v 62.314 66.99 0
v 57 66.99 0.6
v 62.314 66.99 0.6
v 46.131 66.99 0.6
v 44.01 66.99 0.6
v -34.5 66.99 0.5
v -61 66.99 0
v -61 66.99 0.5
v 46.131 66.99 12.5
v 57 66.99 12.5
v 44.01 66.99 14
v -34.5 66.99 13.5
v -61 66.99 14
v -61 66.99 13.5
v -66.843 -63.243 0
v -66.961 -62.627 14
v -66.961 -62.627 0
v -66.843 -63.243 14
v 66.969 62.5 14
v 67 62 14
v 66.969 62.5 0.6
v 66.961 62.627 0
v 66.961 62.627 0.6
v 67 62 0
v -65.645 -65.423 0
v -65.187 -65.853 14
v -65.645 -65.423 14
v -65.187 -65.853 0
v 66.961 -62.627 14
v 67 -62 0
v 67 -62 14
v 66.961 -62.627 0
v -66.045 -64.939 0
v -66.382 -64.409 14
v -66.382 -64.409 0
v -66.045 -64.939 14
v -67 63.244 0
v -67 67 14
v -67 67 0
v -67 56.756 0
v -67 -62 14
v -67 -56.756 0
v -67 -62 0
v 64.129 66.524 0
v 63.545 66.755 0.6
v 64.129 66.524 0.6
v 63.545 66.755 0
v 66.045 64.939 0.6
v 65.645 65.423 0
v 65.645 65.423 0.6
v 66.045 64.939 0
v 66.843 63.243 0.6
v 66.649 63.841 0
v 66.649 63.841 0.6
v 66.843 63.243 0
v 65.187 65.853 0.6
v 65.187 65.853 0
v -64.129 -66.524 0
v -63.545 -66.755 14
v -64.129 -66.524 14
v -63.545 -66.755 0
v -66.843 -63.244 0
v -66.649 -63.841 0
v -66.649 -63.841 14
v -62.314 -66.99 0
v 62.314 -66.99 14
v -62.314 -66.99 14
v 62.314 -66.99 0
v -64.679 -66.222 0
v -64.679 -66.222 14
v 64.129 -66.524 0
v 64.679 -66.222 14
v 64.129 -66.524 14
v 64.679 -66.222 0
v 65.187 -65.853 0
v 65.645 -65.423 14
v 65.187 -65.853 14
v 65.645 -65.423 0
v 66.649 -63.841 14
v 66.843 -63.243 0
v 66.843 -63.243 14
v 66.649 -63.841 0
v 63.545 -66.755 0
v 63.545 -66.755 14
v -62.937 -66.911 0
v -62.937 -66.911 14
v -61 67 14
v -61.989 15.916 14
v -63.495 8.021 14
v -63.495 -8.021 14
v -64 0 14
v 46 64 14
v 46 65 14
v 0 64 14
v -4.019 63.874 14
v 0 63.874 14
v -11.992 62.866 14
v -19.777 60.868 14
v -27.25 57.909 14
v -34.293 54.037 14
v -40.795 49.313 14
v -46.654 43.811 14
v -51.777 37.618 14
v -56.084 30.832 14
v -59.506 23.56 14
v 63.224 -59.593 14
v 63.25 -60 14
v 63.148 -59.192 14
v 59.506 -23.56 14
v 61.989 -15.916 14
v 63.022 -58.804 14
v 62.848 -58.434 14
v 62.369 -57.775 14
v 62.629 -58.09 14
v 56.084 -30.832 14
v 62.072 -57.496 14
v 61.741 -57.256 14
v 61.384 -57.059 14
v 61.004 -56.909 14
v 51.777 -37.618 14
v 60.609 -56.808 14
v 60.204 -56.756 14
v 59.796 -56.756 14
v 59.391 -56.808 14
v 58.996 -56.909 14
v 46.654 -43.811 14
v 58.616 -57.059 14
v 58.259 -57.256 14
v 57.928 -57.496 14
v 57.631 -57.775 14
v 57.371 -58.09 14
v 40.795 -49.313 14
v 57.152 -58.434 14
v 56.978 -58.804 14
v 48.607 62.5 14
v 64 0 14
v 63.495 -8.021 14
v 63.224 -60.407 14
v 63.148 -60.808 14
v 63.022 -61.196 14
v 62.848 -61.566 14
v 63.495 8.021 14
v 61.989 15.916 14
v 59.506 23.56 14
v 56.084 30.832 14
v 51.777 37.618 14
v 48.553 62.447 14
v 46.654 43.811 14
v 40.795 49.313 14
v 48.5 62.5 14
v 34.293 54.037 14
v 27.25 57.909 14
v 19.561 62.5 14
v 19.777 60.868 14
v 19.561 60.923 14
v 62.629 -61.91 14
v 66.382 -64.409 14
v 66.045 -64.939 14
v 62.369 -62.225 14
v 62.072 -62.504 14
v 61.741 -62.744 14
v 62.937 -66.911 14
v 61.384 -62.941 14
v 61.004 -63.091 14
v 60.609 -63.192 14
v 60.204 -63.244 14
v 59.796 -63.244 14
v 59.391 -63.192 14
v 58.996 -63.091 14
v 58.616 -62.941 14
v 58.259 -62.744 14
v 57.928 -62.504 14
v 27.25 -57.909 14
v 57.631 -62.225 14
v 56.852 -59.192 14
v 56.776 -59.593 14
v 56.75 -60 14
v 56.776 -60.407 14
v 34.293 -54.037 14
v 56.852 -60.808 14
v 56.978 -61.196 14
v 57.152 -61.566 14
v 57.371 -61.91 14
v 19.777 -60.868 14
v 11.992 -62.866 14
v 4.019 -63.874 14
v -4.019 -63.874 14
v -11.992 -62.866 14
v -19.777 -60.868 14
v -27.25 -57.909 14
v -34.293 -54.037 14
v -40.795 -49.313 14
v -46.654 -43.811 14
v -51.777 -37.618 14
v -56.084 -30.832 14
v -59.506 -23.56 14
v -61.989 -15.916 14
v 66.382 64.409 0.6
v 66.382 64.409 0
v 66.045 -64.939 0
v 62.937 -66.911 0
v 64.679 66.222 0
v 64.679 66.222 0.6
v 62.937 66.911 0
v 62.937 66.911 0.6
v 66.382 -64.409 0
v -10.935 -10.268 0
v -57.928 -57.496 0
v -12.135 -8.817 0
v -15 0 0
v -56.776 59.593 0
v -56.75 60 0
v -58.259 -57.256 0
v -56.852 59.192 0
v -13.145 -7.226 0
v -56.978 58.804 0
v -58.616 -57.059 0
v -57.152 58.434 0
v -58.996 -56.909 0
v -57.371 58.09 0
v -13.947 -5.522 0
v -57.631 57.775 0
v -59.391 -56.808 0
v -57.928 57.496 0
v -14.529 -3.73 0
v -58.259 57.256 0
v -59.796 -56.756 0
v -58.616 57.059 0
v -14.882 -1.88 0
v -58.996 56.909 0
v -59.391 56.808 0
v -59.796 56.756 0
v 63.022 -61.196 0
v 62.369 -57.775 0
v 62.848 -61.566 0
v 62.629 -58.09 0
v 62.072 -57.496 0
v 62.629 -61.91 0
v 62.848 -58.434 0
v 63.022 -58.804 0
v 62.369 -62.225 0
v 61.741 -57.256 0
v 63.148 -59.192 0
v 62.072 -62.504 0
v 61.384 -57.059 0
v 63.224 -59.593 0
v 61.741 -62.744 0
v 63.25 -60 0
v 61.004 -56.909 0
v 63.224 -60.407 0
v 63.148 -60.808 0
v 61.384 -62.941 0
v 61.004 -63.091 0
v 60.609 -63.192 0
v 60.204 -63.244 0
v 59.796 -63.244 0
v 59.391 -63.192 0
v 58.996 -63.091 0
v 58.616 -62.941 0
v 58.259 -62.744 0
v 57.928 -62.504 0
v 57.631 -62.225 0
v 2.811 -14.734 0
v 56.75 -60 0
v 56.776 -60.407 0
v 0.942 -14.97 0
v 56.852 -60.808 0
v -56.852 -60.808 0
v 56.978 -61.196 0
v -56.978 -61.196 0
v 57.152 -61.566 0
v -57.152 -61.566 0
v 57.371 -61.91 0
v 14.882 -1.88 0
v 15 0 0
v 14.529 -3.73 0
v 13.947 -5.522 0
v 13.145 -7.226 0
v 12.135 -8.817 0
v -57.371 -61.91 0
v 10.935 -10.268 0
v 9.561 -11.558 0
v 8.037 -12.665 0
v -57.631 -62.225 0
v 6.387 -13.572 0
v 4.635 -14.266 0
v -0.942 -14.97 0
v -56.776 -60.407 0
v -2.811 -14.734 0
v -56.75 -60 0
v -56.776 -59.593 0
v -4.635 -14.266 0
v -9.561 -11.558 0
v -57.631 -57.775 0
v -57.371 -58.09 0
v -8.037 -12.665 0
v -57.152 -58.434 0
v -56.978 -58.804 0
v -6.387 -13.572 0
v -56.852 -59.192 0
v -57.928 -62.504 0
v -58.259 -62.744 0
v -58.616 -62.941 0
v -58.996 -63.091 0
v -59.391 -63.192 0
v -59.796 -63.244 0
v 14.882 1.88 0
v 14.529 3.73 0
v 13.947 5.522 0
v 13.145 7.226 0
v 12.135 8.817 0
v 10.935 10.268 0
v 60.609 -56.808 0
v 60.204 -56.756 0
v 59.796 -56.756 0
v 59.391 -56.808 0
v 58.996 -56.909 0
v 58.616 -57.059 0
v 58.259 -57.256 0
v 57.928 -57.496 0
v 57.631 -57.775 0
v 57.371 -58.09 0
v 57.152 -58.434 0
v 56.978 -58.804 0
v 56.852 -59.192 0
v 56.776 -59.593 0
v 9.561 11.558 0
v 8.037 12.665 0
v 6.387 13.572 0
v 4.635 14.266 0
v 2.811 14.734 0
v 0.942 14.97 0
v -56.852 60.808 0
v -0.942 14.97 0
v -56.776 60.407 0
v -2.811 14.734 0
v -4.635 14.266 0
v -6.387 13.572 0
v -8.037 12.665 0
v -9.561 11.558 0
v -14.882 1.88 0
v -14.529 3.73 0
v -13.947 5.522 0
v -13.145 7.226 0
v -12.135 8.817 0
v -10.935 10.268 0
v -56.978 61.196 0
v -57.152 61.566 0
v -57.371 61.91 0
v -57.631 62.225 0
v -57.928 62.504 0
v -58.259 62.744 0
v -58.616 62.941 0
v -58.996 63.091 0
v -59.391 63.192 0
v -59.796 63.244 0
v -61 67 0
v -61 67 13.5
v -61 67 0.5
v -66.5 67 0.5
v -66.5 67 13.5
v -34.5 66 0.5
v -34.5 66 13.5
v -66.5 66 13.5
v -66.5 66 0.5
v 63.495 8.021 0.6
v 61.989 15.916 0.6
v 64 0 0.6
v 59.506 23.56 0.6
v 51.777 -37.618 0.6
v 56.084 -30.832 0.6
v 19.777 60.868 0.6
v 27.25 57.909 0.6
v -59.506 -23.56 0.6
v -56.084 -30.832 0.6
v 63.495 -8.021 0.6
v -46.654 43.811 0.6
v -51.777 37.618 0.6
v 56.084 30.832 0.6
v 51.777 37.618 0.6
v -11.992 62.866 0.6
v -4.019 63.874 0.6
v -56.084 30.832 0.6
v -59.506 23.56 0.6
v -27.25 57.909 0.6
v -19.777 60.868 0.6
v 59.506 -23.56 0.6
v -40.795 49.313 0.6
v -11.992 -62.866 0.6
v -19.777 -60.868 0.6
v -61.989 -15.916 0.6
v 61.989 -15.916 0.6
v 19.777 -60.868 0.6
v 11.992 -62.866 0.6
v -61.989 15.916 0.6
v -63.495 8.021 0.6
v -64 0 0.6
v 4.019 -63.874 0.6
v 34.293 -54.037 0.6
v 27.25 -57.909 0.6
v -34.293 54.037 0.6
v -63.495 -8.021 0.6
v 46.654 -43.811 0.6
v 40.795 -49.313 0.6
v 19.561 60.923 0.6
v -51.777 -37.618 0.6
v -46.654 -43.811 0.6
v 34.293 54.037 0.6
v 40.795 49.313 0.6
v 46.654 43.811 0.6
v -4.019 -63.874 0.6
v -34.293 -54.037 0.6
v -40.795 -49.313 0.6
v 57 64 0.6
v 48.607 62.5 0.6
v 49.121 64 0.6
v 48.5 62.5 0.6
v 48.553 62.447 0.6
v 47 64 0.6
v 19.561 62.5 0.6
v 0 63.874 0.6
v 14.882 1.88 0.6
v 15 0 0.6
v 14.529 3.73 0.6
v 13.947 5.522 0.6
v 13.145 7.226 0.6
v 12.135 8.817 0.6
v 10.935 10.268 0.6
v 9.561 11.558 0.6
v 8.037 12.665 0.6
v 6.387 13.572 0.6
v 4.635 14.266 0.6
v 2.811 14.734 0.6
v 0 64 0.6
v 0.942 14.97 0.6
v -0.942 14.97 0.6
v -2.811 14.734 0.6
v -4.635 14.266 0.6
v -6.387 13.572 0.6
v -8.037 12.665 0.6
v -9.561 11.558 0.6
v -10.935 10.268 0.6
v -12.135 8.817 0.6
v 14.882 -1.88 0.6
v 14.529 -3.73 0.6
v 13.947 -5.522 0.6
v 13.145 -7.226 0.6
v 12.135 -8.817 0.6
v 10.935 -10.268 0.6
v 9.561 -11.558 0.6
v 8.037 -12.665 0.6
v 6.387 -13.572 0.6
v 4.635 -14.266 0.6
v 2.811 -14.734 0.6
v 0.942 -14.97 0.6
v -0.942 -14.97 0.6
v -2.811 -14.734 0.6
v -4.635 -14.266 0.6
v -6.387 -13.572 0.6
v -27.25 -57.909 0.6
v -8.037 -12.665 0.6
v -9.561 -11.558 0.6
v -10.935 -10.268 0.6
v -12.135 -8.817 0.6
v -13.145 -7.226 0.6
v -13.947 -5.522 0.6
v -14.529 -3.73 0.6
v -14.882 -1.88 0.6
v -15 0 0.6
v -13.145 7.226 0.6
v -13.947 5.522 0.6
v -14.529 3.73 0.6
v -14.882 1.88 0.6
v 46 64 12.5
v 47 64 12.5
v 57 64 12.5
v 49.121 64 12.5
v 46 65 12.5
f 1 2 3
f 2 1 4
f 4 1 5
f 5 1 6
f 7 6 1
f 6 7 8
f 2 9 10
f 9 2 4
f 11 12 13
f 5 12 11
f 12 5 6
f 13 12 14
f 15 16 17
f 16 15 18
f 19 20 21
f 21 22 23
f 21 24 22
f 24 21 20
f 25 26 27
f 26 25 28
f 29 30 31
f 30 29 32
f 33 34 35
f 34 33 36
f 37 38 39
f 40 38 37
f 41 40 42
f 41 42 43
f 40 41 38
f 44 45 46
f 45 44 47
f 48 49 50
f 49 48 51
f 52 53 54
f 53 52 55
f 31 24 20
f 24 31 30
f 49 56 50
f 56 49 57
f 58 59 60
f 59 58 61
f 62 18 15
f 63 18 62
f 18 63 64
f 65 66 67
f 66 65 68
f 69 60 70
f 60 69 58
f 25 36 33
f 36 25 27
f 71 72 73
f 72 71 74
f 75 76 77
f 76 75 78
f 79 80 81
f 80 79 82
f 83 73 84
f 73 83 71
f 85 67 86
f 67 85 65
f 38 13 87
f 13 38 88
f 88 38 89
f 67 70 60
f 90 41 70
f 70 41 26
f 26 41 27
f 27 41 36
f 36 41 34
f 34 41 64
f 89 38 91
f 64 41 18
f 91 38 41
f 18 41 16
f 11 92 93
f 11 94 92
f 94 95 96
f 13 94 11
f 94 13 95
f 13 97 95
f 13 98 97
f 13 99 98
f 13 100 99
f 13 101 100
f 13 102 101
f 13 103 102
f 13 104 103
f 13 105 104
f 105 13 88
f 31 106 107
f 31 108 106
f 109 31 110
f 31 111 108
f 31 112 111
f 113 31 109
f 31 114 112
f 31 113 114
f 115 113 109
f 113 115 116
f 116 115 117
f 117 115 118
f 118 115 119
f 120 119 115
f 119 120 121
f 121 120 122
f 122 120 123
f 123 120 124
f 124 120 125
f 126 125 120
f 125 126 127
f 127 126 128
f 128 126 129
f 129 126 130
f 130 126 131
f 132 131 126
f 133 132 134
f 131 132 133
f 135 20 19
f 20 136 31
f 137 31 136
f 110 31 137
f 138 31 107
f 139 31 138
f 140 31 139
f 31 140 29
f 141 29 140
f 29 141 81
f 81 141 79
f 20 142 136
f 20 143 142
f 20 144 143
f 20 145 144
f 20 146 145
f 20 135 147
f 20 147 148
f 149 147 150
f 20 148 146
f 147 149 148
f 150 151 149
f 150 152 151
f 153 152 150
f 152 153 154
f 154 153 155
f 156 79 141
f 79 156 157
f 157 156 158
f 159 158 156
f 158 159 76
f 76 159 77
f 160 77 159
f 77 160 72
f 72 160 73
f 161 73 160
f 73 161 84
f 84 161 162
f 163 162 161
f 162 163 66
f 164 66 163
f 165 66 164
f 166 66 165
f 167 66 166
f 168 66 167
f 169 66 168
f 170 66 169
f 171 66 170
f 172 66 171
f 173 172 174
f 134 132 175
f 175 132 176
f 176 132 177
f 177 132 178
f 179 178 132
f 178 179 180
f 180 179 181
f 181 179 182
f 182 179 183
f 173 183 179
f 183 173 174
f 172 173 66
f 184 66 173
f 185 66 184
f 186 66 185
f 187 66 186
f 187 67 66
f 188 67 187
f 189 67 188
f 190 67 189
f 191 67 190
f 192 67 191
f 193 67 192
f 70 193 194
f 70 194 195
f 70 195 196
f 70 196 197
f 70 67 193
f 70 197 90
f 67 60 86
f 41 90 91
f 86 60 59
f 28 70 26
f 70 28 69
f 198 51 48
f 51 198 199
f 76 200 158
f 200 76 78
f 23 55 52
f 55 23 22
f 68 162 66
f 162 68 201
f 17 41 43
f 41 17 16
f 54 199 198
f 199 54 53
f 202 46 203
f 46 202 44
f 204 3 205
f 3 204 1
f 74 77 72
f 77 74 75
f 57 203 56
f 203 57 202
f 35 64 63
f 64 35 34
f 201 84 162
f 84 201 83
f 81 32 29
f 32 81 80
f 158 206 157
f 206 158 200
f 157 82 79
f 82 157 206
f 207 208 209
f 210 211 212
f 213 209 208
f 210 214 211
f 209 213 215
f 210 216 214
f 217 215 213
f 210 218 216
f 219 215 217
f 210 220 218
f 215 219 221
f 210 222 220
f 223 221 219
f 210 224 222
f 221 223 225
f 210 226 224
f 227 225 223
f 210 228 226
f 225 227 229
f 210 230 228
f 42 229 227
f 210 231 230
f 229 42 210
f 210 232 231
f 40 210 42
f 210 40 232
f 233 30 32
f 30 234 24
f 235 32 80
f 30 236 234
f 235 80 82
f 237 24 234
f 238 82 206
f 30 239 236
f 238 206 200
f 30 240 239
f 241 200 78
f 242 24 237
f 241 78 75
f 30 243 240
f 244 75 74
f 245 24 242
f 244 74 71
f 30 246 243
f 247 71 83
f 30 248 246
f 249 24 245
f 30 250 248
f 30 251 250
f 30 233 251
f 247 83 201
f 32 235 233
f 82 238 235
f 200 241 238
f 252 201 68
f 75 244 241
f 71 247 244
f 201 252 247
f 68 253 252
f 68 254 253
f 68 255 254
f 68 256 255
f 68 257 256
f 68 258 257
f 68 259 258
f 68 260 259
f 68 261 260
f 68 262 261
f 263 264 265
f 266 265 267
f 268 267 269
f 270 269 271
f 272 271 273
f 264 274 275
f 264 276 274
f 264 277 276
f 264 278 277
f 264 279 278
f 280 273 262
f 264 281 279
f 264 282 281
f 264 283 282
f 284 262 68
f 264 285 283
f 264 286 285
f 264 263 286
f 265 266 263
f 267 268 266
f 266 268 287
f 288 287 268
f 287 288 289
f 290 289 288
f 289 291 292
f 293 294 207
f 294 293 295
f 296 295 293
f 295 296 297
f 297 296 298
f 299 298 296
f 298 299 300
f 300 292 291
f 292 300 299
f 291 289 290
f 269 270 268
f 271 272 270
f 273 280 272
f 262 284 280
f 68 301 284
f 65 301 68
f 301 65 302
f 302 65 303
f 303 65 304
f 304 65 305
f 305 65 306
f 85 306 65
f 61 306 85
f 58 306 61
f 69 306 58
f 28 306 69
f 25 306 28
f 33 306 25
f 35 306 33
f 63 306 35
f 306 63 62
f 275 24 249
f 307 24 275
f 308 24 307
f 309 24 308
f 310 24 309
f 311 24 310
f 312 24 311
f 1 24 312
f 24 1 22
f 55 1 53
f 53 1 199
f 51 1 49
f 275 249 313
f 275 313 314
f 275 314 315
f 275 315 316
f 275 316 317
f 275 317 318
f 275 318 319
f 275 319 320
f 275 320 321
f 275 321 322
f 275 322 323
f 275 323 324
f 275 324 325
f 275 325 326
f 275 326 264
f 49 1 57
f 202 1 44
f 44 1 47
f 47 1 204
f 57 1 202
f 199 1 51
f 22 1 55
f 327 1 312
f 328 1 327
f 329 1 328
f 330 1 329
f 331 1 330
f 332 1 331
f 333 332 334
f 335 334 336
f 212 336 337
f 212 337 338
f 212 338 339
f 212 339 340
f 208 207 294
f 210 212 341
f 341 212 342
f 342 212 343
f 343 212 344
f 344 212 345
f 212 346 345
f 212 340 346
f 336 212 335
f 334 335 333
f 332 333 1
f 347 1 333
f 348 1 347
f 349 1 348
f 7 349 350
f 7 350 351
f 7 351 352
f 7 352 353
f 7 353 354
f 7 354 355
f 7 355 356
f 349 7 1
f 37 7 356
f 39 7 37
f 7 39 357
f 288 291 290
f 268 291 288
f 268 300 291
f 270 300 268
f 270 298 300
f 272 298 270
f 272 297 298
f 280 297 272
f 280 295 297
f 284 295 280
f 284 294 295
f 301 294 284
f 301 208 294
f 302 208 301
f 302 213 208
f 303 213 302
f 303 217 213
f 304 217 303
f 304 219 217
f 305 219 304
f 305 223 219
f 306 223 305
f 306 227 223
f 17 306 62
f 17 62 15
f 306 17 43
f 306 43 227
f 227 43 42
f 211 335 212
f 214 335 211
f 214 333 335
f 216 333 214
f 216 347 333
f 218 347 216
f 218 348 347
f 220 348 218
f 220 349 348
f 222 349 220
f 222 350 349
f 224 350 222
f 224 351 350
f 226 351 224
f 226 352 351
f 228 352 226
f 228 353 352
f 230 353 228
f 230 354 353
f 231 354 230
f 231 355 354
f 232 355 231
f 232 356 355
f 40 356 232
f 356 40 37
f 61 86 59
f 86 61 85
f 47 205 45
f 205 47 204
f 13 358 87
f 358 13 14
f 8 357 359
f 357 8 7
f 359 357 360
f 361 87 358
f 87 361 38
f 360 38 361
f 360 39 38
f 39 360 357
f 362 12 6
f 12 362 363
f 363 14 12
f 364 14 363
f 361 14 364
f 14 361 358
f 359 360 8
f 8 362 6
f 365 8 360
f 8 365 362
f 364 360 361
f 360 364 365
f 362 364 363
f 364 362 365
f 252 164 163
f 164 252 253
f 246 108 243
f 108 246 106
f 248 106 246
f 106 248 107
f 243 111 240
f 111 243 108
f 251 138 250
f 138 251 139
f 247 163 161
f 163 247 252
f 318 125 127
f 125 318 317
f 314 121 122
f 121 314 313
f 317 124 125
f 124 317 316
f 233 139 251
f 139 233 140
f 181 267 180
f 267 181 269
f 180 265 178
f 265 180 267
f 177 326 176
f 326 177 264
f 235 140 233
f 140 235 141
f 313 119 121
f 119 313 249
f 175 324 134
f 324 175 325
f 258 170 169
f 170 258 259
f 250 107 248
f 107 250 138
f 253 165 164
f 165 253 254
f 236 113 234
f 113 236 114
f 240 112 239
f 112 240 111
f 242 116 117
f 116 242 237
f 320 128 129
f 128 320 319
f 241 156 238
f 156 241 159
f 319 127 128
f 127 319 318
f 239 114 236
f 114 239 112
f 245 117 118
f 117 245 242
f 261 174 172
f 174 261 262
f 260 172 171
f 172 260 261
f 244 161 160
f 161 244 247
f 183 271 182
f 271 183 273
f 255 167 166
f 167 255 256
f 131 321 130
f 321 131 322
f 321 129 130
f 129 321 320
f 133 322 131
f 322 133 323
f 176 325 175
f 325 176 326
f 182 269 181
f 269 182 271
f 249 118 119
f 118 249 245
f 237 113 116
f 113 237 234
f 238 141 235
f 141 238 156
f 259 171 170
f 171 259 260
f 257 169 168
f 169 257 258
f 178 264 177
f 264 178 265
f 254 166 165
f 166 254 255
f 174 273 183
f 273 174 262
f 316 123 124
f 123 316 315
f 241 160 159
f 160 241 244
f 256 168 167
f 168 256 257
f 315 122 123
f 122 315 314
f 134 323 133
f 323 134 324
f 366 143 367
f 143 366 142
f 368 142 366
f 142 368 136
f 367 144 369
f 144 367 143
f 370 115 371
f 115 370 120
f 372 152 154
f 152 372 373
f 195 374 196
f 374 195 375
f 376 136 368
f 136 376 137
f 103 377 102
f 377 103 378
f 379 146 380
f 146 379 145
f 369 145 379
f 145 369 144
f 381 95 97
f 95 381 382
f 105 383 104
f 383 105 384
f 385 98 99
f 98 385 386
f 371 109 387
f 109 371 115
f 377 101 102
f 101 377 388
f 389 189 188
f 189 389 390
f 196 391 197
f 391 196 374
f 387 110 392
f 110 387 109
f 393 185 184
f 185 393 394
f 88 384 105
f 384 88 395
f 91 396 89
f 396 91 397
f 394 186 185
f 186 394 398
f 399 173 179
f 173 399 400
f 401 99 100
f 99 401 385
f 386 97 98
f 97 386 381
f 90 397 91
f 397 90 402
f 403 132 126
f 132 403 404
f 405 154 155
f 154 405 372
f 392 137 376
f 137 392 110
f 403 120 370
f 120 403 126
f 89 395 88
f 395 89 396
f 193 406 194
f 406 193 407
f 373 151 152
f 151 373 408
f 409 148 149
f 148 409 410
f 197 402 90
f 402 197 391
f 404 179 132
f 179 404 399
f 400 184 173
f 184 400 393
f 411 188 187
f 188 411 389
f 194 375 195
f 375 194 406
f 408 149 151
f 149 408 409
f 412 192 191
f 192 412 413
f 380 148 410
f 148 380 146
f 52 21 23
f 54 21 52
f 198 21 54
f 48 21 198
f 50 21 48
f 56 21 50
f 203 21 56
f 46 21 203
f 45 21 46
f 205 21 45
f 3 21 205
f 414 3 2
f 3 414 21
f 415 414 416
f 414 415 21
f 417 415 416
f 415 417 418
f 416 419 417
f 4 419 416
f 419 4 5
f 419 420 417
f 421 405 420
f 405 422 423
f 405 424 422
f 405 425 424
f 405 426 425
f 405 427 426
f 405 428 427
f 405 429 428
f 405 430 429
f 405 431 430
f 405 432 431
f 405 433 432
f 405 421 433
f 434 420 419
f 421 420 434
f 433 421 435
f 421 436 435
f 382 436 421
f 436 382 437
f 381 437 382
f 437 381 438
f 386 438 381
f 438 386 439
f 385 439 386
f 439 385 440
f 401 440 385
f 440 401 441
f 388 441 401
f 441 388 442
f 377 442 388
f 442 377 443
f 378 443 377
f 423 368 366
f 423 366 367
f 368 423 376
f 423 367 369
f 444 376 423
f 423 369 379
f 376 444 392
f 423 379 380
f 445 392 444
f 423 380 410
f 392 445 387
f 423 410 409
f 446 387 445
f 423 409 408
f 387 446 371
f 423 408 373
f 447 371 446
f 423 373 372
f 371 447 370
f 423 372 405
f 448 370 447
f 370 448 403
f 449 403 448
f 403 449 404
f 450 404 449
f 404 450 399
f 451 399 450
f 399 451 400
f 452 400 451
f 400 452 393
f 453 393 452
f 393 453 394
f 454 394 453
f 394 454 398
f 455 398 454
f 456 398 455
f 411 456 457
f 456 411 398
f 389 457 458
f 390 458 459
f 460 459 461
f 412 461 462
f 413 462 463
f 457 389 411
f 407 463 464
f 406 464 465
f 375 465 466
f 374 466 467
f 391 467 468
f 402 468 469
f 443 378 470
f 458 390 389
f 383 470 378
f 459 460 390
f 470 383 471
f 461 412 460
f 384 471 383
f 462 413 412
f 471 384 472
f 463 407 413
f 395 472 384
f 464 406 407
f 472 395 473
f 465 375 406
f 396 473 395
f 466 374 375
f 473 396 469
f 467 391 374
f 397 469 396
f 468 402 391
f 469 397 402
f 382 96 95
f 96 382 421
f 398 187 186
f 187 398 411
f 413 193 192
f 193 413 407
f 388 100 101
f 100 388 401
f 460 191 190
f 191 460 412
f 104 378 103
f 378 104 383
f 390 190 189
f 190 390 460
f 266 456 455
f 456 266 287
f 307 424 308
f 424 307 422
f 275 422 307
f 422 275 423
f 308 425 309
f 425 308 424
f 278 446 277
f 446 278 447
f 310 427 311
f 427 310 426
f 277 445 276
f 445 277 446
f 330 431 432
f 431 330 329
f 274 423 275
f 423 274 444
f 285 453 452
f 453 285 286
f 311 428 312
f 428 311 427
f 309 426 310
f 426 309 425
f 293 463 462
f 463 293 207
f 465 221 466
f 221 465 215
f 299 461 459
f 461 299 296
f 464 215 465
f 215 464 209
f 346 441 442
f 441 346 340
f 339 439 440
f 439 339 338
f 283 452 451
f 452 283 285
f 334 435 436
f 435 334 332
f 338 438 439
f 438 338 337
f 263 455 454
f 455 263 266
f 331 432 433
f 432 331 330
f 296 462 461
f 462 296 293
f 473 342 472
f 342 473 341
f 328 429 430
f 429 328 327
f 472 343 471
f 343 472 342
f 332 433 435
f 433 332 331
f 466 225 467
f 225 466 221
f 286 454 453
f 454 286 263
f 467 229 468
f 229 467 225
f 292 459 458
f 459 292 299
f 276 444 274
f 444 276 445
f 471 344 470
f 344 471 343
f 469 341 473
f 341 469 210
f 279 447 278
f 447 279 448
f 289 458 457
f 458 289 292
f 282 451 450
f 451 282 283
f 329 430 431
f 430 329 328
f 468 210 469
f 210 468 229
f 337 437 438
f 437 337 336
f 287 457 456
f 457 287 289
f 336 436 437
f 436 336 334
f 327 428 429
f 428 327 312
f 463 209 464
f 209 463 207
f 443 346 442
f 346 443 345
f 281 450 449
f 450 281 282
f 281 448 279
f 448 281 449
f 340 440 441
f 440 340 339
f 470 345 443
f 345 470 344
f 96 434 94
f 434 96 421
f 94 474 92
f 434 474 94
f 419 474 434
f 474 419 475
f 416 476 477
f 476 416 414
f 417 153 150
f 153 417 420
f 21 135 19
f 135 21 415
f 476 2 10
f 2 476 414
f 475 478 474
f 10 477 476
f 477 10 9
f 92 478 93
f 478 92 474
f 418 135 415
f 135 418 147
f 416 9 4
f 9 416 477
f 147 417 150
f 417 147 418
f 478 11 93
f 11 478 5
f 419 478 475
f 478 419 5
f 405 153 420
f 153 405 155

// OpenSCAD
$fn = 50;


difference() {
	union() {
		hull() {
			translate(v = [-62.0000000000, 62.0000000000, 0]) {
				cylinder(h = 14, r = 5);
			}
			translate(v = [62.0000000000, 62.0000000000, 0]) {
				cylinder(h = 14, r = 5);
			}
			translate(v = [-62.0000000000, -62.0000000000, 0]) {
				cylinder(h = 14, r = 5);
			}
			translate(v = [62.0000000000, -62.0000000000, 0]) {
				cylinder(h = 14, r = 5);
			}
		}
		translate(v = [-67.0000000000, 61.0000000000, 0]) {
			cube(size = [6, 6, 14]);
		}
	}
	union() {
		translate(v = [-67.5000000000, -60.0000000000, -250.0000000000]) {
			rotate(a = [0, 0, 0]) {
				difference() {
					union() {
						hull() {
							translate(v = [7.5000000000, 0, 0]) {
								cylinder(h = 250, r = 3.2500000000, r1 = 3.2500000000, r2 = 3.2500000000);
							}
							translate(v = [-7.5000000000, 0, 0]) {
								cylinder(h = 250, r = 3.2500000000, r1 = 3.2500000000, r2 = 3.2500000000);
							}
						}
					}
					union();
				}
			}
		}
		translate(v = [-67.5000000000, 60.0000000000, -250.0000000000]) {
			rotate(a = [0, 0, 0]) {
				difference() {
					union() {
						hull() {
							translate(v = [7.5000000000, 0, 0]) {
								cylinder(h = 250, r = 3.2500000000, r1 = 3.2500000000, r2 = 3.2500000000);
							}
							translate(v = [-7.5000000000, 0, 0]) {
								cylinder(h = 250, r = 3.2500000000, r1 = 3.2500000000, r2 = 3.2500000000);
							}
						}
					}
					union();
				}
			}
		}
		translate(v = [-66.5000000000, 66.0000000000, 0.5000000000]) {
			cube(size = [32, 1, 13.0000000000]);
		}
		translate(v = [60.0000000000, -60.0000000000, -50.0000000000]) {
			cylinder(h = 100, r = 3.2500000000);
		}
		translate(v = [0, 0, 0.6000000000]) {
			cylinder(h = 16.4000000000, r = 64.0000000000);
		}
		translate(v = [0, 0, -7.0000000000]) {
			cylinder(h = 14, r = 15.0000000000);
		}
		translate(v = [0.0000000000, 62.5000000000, 0.6000000000]) {
			cube(size = [67.0000000000, 1.5000000000, 16.4000000000]);
		}
		translate(v = [57.0000000000, 62.5000000000, 0.6000000000]) {
			cube(size = [10, 4.5000000000, 16.4000000000]);
		}
		translate(v = [46.0000000000, 62.5000000000, 12.5000000000]) {
			cube(size = [21, 4.5000000000, 1.5000000000]);
		}
		translate(v = [43.2500000000, 67.7500000000, 0.6000000000]) {
			rotate(a = [0, 0, -45]) {
				cube(size = [7.5000000000, 1.5000000000, 16.4000000000]);
			}
		}
		translate(v = [12.0610000000, 60.5000000000, 0.6000000000]) {
			cube(size = [7.5000000000, 2, 13.4000000000]);
		}
	}
}
